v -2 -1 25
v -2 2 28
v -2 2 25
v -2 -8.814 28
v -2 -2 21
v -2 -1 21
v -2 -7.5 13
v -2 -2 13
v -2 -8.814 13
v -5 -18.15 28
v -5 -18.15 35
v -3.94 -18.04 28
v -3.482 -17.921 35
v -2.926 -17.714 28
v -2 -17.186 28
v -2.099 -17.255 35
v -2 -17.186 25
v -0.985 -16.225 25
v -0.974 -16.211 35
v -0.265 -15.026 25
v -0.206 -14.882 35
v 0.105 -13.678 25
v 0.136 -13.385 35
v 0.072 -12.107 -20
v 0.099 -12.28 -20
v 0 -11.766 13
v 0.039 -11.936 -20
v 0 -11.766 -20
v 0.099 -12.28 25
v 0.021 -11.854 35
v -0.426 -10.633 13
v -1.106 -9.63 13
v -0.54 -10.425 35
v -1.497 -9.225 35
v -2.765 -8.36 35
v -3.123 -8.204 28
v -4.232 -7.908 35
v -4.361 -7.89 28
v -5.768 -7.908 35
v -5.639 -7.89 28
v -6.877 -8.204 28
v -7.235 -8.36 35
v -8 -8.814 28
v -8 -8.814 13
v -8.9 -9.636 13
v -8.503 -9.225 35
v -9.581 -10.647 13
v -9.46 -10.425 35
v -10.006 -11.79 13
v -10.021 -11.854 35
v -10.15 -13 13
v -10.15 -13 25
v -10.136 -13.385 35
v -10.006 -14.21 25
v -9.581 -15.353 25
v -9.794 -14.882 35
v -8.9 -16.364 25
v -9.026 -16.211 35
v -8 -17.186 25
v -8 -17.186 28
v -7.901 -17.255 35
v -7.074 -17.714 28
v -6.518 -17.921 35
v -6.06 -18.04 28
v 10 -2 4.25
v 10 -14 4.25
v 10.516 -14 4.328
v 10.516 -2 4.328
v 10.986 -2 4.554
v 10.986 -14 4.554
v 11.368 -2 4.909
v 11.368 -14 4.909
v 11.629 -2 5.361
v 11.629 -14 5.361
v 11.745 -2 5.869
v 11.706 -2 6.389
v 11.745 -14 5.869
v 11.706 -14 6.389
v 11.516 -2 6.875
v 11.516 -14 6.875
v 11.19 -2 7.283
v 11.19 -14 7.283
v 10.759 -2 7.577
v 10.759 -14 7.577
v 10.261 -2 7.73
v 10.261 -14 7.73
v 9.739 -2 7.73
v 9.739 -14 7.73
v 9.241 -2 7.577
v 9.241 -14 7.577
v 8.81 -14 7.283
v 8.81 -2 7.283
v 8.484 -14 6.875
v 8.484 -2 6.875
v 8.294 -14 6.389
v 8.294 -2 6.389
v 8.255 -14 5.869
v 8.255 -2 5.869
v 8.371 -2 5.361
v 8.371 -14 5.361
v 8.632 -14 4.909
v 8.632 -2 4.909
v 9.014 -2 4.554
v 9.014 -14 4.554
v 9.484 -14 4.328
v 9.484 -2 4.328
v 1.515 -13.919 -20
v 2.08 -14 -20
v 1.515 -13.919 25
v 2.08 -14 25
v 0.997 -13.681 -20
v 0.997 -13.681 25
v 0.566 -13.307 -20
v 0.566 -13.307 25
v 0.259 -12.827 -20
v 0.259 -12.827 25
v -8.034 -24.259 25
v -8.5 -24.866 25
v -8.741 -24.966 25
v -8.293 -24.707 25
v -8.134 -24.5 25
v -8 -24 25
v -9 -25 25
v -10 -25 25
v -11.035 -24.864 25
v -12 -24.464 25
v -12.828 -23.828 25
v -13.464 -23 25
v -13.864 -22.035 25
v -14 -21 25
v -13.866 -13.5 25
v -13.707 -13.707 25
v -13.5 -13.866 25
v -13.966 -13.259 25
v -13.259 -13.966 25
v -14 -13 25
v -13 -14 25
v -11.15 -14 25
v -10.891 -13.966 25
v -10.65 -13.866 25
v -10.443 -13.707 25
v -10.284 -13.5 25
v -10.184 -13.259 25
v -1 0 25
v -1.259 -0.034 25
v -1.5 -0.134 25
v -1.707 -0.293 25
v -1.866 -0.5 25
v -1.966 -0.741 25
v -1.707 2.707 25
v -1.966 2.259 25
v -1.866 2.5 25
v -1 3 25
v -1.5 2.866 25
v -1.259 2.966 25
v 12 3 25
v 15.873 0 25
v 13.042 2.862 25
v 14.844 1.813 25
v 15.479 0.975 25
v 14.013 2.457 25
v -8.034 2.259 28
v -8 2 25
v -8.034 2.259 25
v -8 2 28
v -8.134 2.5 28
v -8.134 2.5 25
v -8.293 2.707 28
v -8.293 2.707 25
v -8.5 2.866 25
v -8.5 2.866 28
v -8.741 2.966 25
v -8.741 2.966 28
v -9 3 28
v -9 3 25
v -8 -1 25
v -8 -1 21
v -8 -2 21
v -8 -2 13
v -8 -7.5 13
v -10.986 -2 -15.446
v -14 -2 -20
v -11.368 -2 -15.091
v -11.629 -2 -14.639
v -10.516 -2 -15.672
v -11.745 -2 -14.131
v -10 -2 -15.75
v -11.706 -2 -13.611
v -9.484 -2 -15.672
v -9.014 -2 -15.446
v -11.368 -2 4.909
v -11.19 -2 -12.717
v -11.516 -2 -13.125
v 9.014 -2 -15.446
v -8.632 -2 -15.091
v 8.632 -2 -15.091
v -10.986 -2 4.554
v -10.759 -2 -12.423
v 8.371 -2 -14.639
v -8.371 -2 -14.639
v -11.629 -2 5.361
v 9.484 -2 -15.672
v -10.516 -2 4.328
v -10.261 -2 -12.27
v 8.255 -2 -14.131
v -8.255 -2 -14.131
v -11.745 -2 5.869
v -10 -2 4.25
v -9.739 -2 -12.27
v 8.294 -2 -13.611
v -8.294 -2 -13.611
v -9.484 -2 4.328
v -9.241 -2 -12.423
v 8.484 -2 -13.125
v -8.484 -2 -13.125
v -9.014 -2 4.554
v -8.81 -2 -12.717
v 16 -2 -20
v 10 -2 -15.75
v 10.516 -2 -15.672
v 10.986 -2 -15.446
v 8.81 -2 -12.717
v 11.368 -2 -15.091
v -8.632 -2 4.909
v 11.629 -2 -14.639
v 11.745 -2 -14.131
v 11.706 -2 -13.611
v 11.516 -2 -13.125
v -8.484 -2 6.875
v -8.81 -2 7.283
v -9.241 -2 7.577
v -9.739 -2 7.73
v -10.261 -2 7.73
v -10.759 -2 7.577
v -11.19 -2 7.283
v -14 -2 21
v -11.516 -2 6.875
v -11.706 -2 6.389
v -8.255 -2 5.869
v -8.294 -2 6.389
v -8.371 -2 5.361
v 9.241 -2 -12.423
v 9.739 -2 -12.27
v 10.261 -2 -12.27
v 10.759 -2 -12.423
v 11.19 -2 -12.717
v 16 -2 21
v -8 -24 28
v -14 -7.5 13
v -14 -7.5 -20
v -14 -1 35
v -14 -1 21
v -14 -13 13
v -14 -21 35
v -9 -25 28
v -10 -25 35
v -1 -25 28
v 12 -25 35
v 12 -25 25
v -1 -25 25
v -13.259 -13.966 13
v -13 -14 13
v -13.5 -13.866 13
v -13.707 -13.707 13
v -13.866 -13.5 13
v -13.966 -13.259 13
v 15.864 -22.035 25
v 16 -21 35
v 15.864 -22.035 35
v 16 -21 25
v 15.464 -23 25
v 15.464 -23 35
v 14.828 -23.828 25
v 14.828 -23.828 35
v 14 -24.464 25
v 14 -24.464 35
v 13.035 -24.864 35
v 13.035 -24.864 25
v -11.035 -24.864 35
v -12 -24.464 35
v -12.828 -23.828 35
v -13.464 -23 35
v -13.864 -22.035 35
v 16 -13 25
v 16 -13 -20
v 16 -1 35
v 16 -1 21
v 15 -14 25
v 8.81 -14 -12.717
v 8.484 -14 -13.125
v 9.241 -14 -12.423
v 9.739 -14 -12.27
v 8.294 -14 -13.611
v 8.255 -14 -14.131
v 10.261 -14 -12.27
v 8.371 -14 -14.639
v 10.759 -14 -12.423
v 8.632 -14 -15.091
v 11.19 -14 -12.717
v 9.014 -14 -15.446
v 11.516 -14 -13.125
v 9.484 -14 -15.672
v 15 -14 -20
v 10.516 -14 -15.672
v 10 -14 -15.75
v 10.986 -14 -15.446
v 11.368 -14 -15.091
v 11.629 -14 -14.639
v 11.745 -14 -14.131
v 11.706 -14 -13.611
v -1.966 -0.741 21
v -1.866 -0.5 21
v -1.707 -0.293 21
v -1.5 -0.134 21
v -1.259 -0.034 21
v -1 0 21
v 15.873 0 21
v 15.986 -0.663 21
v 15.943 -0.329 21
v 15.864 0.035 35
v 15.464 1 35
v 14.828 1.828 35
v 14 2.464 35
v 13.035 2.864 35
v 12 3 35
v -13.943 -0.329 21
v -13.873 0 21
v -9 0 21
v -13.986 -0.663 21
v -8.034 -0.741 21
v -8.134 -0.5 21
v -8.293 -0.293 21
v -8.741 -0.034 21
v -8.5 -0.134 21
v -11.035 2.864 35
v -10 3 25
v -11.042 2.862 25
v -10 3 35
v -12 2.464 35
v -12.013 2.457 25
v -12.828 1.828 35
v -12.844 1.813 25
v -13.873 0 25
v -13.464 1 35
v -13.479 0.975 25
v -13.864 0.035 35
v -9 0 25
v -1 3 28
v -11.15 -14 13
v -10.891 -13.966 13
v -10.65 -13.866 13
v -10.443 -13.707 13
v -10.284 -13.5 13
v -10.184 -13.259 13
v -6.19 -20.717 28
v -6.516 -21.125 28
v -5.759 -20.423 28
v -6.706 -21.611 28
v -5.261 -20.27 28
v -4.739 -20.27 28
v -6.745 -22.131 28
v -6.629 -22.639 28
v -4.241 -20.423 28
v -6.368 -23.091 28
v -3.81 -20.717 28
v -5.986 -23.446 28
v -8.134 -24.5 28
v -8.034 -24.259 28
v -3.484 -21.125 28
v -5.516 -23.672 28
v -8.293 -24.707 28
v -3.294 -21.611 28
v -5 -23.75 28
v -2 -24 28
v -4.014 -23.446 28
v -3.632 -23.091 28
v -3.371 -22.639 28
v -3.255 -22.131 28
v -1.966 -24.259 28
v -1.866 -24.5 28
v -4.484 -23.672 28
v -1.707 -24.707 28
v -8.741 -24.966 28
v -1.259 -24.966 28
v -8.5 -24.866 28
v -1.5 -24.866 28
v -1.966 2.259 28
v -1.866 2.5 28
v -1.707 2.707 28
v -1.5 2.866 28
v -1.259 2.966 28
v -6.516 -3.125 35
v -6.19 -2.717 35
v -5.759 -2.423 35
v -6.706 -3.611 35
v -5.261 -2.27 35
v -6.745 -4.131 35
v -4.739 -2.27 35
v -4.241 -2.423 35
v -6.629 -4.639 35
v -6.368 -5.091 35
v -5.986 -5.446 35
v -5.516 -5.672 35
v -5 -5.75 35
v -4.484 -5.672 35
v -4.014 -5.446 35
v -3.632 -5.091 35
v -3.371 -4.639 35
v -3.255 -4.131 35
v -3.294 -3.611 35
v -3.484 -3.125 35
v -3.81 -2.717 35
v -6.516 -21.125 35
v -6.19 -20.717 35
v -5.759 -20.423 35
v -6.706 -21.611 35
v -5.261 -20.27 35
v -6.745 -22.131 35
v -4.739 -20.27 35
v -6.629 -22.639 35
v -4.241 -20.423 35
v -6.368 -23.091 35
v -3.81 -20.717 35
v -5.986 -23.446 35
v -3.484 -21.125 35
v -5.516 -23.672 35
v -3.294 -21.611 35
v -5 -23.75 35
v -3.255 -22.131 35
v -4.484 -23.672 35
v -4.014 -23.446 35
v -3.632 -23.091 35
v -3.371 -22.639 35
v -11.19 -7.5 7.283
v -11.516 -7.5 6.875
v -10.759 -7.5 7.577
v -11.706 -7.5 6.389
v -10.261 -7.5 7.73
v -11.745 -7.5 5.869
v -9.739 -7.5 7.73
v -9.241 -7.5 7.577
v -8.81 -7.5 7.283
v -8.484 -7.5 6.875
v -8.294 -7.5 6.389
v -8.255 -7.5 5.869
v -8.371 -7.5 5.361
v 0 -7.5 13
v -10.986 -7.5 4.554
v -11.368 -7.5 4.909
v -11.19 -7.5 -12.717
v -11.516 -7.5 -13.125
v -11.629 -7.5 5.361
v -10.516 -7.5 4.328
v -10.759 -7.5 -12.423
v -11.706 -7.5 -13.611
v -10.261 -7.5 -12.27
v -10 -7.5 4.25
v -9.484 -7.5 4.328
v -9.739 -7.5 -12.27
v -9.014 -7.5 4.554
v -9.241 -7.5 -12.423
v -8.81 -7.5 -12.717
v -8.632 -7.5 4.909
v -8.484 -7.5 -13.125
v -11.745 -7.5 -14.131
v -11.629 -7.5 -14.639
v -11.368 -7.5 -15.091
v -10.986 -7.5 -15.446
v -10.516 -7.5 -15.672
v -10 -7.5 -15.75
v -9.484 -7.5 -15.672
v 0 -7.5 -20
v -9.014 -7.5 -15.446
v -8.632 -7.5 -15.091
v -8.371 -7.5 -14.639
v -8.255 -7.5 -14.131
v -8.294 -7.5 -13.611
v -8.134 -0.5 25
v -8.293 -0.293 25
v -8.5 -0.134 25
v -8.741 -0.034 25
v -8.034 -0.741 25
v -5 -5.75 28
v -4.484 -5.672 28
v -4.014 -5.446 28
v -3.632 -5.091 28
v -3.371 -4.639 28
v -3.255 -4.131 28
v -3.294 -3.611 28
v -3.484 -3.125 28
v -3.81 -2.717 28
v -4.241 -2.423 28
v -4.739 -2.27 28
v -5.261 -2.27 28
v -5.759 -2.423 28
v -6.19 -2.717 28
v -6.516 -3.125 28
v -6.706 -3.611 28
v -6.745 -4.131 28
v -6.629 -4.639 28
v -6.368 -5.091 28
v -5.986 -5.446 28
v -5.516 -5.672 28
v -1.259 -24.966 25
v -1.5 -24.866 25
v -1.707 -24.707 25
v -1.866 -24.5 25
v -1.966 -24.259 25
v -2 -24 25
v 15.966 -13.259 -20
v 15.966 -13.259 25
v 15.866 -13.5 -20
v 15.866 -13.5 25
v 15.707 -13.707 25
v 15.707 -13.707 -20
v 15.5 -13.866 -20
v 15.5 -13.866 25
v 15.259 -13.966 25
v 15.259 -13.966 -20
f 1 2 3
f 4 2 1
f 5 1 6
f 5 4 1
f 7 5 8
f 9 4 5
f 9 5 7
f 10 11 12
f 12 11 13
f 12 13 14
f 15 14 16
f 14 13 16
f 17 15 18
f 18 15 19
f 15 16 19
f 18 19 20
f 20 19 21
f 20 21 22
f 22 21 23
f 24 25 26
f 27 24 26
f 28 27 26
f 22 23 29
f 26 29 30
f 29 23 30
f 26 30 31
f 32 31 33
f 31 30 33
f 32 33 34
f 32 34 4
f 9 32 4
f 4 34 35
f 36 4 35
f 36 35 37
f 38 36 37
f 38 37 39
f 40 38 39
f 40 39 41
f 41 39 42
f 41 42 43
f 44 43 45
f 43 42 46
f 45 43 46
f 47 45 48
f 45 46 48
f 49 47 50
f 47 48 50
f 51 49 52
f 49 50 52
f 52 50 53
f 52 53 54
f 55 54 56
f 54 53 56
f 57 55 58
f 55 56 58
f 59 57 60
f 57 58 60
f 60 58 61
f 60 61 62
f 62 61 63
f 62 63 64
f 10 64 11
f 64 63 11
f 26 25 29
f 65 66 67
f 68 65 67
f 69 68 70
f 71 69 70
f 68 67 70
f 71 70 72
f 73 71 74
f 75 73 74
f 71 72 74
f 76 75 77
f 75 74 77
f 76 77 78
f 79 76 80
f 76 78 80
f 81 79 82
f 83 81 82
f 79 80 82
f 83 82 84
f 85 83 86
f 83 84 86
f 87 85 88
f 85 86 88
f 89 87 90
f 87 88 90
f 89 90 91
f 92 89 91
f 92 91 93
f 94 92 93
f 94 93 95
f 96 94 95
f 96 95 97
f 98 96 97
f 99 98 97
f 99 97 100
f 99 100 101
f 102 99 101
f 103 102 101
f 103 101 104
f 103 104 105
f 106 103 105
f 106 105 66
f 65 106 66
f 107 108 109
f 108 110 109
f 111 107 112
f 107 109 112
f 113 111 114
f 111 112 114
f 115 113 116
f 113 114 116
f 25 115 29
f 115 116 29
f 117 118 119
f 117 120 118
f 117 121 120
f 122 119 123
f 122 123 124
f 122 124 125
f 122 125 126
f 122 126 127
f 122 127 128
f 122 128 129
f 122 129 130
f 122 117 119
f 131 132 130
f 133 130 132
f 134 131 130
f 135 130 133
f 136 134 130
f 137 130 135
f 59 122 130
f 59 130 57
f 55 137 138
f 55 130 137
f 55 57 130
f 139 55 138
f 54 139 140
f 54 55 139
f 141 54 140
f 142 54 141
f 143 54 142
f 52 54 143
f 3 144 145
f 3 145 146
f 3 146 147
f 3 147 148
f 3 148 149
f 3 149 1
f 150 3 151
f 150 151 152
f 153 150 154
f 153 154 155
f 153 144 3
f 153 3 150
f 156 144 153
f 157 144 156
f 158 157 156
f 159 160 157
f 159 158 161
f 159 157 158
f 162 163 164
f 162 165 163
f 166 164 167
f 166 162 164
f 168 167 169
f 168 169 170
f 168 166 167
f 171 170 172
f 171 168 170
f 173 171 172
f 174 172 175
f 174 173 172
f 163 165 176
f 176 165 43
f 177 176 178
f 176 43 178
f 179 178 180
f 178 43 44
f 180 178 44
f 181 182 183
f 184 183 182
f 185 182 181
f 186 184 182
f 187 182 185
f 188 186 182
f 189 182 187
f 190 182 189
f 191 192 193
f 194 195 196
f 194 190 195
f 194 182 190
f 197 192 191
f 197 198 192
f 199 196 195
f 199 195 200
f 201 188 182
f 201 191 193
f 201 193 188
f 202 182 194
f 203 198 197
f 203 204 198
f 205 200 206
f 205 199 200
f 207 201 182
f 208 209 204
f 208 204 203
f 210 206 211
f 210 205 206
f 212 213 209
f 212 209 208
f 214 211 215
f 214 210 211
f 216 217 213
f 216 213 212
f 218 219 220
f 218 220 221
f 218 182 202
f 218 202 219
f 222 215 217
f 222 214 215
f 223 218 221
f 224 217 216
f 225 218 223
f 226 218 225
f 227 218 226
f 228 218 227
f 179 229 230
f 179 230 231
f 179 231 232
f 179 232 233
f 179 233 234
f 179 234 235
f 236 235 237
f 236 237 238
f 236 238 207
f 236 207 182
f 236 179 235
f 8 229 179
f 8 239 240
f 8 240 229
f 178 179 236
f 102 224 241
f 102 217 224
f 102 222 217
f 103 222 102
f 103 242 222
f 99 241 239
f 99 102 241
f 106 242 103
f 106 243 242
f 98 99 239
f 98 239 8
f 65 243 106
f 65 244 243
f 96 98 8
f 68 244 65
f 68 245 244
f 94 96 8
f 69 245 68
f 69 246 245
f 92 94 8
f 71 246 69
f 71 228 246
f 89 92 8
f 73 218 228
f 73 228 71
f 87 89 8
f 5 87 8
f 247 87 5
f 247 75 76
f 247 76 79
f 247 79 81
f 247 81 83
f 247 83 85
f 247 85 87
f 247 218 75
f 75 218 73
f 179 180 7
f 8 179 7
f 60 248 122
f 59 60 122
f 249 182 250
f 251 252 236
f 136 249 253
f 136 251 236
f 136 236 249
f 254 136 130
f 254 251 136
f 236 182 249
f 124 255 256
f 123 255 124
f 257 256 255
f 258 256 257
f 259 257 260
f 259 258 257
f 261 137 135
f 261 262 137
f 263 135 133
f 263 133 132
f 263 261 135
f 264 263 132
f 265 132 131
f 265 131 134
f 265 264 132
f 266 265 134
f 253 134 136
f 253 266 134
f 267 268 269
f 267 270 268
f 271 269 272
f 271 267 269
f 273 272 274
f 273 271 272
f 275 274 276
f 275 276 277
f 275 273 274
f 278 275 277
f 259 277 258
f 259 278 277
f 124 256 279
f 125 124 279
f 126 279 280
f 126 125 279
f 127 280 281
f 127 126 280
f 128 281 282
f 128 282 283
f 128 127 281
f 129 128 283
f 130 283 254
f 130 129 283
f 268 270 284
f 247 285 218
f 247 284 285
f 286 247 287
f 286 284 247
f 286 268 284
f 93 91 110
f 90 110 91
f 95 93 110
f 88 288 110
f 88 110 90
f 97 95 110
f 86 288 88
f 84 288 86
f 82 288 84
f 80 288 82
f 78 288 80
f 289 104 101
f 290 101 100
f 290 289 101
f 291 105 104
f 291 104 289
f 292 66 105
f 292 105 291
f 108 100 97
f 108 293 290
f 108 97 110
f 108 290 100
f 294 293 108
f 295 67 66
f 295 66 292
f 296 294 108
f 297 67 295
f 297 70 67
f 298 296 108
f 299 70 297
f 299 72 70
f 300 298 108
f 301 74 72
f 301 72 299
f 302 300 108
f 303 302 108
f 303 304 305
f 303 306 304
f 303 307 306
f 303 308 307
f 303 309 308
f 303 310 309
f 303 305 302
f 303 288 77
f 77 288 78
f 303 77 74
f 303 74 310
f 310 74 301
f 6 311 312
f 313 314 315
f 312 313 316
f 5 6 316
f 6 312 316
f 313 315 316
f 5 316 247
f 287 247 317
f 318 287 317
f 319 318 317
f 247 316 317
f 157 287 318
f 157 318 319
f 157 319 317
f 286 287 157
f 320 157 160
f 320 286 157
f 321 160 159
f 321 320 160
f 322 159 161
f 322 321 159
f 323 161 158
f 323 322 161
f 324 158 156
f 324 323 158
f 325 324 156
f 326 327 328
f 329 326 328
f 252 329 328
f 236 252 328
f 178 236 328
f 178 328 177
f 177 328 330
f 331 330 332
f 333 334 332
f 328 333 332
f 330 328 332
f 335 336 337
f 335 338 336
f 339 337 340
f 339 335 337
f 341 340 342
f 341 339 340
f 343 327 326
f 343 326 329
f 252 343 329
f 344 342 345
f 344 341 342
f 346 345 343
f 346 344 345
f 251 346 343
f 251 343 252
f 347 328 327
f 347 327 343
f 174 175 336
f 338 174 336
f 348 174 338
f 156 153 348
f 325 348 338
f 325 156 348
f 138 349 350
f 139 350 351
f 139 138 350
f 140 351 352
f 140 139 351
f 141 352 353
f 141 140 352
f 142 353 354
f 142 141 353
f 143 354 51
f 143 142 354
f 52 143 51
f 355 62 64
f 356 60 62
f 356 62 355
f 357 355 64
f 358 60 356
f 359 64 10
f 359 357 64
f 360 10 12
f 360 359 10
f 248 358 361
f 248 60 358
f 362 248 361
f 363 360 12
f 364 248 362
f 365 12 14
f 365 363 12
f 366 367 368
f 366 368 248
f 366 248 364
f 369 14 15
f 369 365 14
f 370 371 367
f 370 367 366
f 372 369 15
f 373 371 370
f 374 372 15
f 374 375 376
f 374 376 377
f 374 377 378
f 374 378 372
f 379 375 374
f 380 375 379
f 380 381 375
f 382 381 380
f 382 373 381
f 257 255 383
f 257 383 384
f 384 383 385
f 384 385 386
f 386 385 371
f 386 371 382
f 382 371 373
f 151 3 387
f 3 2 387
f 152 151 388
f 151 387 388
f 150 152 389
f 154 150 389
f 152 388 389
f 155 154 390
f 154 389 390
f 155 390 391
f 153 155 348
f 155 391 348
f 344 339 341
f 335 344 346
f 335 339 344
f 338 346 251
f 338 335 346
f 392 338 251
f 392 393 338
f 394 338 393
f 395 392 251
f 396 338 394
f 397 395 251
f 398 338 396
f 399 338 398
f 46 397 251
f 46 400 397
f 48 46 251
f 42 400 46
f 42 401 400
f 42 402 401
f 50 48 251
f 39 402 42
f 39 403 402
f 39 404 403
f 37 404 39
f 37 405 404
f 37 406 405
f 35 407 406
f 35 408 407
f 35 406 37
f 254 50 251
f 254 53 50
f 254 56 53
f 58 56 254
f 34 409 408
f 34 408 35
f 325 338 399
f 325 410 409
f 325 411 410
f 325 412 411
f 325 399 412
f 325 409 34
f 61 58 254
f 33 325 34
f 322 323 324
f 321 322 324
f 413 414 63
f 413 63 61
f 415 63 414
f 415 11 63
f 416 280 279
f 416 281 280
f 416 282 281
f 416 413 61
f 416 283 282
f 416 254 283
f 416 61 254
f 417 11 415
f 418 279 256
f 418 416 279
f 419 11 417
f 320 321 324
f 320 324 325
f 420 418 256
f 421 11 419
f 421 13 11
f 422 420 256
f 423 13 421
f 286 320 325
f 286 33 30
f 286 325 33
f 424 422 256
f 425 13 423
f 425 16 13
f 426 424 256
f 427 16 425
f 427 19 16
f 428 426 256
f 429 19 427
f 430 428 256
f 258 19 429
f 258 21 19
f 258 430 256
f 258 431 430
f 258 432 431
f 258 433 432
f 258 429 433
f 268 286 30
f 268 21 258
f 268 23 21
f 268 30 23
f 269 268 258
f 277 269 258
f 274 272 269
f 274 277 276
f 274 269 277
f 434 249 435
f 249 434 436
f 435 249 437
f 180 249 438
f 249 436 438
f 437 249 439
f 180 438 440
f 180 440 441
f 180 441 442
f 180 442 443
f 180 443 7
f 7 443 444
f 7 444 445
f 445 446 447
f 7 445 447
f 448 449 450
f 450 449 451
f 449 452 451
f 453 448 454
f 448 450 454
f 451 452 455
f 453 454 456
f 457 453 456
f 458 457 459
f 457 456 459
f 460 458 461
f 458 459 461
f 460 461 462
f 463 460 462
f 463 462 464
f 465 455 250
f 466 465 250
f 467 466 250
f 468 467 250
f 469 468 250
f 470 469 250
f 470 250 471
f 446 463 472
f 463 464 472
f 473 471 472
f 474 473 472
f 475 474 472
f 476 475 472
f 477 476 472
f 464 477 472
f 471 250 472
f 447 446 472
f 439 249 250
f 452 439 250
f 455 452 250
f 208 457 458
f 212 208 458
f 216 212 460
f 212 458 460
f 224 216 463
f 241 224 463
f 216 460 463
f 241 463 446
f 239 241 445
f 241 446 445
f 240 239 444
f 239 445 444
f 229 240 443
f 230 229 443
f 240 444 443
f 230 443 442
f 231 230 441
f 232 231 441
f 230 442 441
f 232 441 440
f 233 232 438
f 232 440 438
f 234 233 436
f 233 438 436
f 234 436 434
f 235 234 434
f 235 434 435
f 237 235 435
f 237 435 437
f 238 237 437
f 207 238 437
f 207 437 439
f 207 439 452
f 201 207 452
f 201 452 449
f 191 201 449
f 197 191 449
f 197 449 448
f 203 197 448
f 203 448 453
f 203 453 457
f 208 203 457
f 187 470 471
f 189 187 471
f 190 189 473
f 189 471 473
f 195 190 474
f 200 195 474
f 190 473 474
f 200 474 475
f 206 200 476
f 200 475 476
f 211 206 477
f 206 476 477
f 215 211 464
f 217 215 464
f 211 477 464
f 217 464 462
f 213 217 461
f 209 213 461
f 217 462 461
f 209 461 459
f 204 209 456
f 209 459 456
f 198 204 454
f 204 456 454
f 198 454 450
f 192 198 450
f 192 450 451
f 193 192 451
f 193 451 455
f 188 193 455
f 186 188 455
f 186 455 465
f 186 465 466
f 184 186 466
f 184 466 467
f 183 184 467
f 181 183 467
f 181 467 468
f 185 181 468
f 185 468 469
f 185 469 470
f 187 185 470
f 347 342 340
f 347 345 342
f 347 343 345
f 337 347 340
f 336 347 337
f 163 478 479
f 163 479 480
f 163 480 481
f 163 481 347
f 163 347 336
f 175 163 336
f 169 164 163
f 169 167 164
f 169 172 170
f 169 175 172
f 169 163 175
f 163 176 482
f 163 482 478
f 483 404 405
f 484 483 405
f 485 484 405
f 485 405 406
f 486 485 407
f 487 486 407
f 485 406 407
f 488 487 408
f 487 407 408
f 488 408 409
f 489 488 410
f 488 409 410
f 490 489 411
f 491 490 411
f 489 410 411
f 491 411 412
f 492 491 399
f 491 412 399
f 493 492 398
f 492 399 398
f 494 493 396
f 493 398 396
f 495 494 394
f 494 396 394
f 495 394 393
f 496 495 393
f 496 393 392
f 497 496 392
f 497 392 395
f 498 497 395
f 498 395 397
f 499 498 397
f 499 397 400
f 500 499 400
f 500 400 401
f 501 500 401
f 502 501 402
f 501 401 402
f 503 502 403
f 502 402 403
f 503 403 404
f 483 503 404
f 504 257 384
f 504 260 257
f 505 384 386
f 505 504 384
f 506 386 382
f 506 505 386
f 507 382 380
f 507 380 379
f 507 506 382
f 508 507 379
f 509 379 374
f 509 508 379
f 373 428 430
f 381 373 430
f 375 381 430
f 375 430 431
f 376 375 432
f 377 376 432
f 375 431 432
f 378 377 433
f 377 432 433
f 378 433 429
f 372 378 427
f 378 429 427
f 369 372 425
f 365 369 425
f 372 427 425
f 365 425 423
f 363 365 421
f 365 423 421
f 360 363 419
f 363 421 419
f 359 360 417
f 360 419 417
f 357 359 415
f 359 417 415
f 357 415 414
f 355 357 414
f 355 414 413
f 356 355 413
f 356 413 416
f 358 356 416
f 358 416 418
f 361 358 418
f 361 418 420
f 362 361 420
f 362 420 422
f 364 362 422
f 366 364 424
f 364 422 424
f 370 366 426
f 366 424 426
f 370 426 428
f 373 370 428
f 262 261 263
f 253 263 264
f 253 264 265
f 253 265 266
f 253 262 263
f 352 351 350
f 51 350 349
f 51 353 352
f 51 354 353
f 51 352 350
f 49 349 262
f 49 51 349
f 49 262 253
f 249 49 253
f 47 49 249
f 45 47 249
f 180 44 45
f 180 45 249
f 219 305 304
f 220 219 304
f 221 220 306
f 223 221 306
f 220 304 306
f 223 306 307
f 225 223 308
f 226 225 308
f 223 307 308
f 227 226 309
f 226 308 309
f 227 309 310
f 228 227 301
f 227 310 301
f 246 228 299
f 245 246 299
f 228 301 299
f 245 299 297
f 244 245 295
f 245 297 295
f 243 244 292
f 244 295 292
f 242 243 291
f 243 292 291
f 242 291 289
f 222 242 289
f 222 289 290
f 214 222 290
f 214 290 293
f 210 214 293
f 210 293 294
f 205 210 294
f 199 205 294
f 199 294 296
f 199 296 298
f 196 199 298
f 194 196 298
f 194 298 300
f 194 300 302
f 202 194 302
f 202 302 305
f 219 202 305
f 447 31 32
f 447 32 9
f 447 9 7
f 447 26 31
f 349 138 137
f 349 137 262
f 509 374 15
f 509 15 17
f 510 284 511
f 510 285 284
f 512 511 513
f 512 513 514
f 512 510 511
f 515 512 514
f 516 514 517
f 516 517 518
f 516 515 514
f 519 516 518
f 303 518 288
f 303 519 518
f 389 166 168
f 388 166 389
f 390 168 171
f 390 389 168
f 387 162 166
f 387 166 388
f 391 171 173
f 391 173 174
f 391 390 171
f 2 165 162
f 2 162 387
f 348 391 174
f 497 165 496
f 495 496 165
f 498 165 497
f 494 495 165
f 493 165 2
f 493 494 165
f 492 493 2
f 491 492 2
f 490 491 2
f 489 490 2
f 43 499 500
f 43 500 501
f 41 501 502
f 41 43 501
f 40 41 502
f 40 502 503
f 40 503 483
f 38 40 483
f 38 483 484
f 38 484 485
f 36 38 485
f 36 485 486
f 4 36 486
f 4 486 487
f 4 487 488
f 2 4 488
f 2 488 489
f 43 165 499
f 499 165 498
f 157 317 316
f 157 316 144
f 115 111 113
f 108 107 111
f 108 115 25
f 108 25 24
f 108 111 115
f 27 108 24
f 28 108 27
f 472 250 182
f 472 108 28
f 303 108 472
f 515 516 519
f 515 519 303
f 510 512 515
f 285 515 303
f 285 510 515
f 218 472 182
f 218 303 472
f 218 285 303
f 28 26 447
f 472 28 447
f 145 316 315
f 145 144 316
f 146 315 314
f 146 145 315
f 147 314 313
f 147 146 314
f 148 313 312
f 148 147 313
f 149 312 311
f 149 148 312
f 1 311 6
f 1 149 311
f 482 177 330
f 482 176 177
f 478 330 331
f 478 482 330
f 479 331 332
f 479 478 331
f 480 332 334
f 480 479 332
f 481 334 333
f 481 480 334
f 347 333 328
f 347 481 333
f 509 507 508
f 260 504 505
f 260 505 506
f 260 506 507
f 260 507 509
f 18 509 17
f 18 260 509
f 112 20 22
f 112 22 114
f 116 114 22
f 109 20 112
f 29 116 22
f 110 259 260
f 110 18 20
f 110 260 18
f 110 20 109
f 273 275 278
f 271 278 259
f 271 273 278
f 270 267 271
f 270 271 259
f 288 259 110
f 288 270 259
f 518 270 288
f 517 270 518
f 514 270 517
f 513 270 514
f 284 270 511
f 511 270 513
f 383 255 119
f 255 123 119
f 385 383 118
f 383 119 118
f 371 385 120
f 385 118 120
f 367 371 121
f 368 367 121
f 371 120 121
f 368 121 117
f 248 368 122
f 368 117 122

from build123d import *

# Parameters (mm, degrees)
PAD001_DEPTH      = 16
PAD001_DEPTH_BACK = 16
SKETCH014_W       = 15
SKETCH014_H       = 6
POCKET_DEPTH      = 28.001
SKETCH012_R       = 5.15
POCKET001_DEPTH   = 55.001
SKETCH013_R       = 1.75
POCKET002_DEPTH   = 7
SKETCH008_W       = 7.407674
SKETCH008_H       = 16
POCKET003_DEPTH   = 33
SKETCH007_R       = 1.75
POCKET004_DEPTH   = 17.001
SKETCH015_W       = 50.47
SKETCH015_H       = 40
POCKET005_DEPTH   = 2
SKETCH016_W       = 51.98
SKETCH016_H       = 14.53
POCKET006_DEPTH   = 55.001
FILLET_R          = 4
FILLET001_R       = 1
FILLET002_R       = 2
FILLET003_R       = 1
FILLET004_R       = 1
FILLET005_R       = 1
FILLET006_R       = 1


with BuildPart() as part:
    # Sketch005 → Pad001 (new body, two sides)
    with BuildSketch(Plane.YZ) as pad001_sk:
        Polygon((0, -20), (0, 25), (3, 25), (3, 35), (-25, 35), (-25, 25), (-14, 25), (-14, -20), align=None)
    extrude(amount=PAD001_DEPTH)
    extrude(pad001_sk.sketch, amount=-PAD001_DEPTH_BACK)

    # Sketch014 (on Face5 of Pad001) → Pocket (cut, through all)
    with BuildSketch(Plane(origin=(0, -25, 0), x_dir=(0, 0, -1), z_dir=(0, -1, 0))):
        with Locations((-20.5, -5)):
            Rectangle(SKETCH014_W, SKETCH014_H)
    extrude(amount=-POCKET_DEPTH, mode=Mode.SUBTRACT)

    # Sketch012 → Pocket001 (cut, through all)
    with BuildSketch(Plane(origin=(0, 0, 35), x_dir=(0, -1, 0), z_dir=(0, 0, 1))):
        with Locations((13, -5)):
            Circle(SKETCH012_R)
    extrude(amount=-POCKET001_DEPTH, mode=Mode.SUBTRACT)

    # Sketch013 → Pocket002 (cut)
    with BuildSketch(Plane(origin=(0, 0, 35), x_dir=(0, -1, 0), z_dir=(0, 0, 1))):
        with Locations((4, -5)):
            Circle(SKETCH013_R)
        with Locations((22, -5)):
            Circle(SKETCH013_R)
    extrude(amount=-POCKET002_DEPTH, mode=Mode.SUBTRACT)

    # Sketch008 (on Face9 of Pocket002) → Pocket003 (cut)
    with BuildSketch(Plane.YX.offset(20)):
        with Locations((-11.203837, -8)):
            Rectangle(SKETCH008_W, SKETCH008_H)
    extrude(amount=-POCKET003_DEPTH, mode=Mode.SUBTRACT)

    # Sketch007 (on Face21 of Pocket003) → Pocket004 (cut, through all)
    with BuildSketch(Plane(origin=(0, -14, 0), x_dir=(0, 0, -1), z_dir=(0, -1, 0))):
        with Locations((-6, 10)):
            Circle(SKETCH007_R)
        with Locations((14, 10)):
            Circle(SKETCH007_R)
        with Locations((-6, -10)):
            Circle(SKETCH007_R)
        with Locations((14, -10)):
            Circle(SKETCH007_R)
    extrude(amount=-POCKET004_DEPTH, mode=Mode.SUBTRACT)

    # Sketch015 (on Face1 of Pocket004) → Pocket005 (cut)
    with BuildSketch(Plane.ZX):
        with Locations((-4.235, 0)):
            Rectangle(SKETCH015_W, SKETCH015_H)
    extrude(amount=-POCKET005_DEPTH, mode=Mode.SUBTRACT)

    # Sketch016 (on Face11 of Pocket005) → Pocket006 (cut, through all)
    with BuildSketch(Plane(origin=(0, 0, 35), x_dir=(0, -1, 0), z_dir=(0, 0, 1))):
        with Locations((19.41, -21.265)):
            Rectangle(SKETCH016_W, SKETCH016_H)
    extrude(amount=-POCKET006_DEPTH, mode=Mode.SUBTRACT)

    # Fillet
    fillet_edges = [part.edges().sort_by_distance(p)[0] for p in [
        (16, -25, 30),
        (-14, -25, 30),
        (16, 3, 30),
        (-14, 3, 30),
    ]]
    fillet(fillet_edges, radius=FILLET_R)

    # Fillet001
    fillet001_edges = [part.edges().sort_by_distance(p)[0] for p in [
        (-2, -25, 26.5),
        (-8, -25, 26.5),
    ]]
    fillet(fillet001_edges, radius=FILLET001_R)

    # Fillet002
    fillet002_edges = [part.edges().sort_by_distance(p)[0] for p in [
        (0.05198, -14, 2.5),
    ]]
    fillet(fillet002_edges, radius=FILLET002_R)

    # Fillet003
    fillet003_edges = [part.edges().sort_by_distance(p)[0] for p in [
        (-14, -14, 19),
        (-10.05198, -14, 19),
    ]]
    fillet(fillet003_edges, radius=FILLET003_R)

    # Fillet004
    fillet004_edges = [part.edges().sort_by_distance(p)[0] for p in [
        (-2, 3, 26.5),
        (-8, 3, 26.5),
    ]]
    fillet(fillet004_edges, radius=FILLET004_R)

    # Fillet005
    fillet005_edges = [part.edges().sort_by_distance(p)[0] for p in [
        (-8, 0, 23),
        (-2, 0, 23),
    ]]
    fillet(fillet005_edges, radius=FILLET005_R)

    # Fillet006
    fillet006_edges = [part.edges().sort_by_distance(p)[0] for p in [
        (16, -14, 2.5),
    ]]
    fillet(fillet006_edges, radius=FILLET006_R)


solid = part.part
